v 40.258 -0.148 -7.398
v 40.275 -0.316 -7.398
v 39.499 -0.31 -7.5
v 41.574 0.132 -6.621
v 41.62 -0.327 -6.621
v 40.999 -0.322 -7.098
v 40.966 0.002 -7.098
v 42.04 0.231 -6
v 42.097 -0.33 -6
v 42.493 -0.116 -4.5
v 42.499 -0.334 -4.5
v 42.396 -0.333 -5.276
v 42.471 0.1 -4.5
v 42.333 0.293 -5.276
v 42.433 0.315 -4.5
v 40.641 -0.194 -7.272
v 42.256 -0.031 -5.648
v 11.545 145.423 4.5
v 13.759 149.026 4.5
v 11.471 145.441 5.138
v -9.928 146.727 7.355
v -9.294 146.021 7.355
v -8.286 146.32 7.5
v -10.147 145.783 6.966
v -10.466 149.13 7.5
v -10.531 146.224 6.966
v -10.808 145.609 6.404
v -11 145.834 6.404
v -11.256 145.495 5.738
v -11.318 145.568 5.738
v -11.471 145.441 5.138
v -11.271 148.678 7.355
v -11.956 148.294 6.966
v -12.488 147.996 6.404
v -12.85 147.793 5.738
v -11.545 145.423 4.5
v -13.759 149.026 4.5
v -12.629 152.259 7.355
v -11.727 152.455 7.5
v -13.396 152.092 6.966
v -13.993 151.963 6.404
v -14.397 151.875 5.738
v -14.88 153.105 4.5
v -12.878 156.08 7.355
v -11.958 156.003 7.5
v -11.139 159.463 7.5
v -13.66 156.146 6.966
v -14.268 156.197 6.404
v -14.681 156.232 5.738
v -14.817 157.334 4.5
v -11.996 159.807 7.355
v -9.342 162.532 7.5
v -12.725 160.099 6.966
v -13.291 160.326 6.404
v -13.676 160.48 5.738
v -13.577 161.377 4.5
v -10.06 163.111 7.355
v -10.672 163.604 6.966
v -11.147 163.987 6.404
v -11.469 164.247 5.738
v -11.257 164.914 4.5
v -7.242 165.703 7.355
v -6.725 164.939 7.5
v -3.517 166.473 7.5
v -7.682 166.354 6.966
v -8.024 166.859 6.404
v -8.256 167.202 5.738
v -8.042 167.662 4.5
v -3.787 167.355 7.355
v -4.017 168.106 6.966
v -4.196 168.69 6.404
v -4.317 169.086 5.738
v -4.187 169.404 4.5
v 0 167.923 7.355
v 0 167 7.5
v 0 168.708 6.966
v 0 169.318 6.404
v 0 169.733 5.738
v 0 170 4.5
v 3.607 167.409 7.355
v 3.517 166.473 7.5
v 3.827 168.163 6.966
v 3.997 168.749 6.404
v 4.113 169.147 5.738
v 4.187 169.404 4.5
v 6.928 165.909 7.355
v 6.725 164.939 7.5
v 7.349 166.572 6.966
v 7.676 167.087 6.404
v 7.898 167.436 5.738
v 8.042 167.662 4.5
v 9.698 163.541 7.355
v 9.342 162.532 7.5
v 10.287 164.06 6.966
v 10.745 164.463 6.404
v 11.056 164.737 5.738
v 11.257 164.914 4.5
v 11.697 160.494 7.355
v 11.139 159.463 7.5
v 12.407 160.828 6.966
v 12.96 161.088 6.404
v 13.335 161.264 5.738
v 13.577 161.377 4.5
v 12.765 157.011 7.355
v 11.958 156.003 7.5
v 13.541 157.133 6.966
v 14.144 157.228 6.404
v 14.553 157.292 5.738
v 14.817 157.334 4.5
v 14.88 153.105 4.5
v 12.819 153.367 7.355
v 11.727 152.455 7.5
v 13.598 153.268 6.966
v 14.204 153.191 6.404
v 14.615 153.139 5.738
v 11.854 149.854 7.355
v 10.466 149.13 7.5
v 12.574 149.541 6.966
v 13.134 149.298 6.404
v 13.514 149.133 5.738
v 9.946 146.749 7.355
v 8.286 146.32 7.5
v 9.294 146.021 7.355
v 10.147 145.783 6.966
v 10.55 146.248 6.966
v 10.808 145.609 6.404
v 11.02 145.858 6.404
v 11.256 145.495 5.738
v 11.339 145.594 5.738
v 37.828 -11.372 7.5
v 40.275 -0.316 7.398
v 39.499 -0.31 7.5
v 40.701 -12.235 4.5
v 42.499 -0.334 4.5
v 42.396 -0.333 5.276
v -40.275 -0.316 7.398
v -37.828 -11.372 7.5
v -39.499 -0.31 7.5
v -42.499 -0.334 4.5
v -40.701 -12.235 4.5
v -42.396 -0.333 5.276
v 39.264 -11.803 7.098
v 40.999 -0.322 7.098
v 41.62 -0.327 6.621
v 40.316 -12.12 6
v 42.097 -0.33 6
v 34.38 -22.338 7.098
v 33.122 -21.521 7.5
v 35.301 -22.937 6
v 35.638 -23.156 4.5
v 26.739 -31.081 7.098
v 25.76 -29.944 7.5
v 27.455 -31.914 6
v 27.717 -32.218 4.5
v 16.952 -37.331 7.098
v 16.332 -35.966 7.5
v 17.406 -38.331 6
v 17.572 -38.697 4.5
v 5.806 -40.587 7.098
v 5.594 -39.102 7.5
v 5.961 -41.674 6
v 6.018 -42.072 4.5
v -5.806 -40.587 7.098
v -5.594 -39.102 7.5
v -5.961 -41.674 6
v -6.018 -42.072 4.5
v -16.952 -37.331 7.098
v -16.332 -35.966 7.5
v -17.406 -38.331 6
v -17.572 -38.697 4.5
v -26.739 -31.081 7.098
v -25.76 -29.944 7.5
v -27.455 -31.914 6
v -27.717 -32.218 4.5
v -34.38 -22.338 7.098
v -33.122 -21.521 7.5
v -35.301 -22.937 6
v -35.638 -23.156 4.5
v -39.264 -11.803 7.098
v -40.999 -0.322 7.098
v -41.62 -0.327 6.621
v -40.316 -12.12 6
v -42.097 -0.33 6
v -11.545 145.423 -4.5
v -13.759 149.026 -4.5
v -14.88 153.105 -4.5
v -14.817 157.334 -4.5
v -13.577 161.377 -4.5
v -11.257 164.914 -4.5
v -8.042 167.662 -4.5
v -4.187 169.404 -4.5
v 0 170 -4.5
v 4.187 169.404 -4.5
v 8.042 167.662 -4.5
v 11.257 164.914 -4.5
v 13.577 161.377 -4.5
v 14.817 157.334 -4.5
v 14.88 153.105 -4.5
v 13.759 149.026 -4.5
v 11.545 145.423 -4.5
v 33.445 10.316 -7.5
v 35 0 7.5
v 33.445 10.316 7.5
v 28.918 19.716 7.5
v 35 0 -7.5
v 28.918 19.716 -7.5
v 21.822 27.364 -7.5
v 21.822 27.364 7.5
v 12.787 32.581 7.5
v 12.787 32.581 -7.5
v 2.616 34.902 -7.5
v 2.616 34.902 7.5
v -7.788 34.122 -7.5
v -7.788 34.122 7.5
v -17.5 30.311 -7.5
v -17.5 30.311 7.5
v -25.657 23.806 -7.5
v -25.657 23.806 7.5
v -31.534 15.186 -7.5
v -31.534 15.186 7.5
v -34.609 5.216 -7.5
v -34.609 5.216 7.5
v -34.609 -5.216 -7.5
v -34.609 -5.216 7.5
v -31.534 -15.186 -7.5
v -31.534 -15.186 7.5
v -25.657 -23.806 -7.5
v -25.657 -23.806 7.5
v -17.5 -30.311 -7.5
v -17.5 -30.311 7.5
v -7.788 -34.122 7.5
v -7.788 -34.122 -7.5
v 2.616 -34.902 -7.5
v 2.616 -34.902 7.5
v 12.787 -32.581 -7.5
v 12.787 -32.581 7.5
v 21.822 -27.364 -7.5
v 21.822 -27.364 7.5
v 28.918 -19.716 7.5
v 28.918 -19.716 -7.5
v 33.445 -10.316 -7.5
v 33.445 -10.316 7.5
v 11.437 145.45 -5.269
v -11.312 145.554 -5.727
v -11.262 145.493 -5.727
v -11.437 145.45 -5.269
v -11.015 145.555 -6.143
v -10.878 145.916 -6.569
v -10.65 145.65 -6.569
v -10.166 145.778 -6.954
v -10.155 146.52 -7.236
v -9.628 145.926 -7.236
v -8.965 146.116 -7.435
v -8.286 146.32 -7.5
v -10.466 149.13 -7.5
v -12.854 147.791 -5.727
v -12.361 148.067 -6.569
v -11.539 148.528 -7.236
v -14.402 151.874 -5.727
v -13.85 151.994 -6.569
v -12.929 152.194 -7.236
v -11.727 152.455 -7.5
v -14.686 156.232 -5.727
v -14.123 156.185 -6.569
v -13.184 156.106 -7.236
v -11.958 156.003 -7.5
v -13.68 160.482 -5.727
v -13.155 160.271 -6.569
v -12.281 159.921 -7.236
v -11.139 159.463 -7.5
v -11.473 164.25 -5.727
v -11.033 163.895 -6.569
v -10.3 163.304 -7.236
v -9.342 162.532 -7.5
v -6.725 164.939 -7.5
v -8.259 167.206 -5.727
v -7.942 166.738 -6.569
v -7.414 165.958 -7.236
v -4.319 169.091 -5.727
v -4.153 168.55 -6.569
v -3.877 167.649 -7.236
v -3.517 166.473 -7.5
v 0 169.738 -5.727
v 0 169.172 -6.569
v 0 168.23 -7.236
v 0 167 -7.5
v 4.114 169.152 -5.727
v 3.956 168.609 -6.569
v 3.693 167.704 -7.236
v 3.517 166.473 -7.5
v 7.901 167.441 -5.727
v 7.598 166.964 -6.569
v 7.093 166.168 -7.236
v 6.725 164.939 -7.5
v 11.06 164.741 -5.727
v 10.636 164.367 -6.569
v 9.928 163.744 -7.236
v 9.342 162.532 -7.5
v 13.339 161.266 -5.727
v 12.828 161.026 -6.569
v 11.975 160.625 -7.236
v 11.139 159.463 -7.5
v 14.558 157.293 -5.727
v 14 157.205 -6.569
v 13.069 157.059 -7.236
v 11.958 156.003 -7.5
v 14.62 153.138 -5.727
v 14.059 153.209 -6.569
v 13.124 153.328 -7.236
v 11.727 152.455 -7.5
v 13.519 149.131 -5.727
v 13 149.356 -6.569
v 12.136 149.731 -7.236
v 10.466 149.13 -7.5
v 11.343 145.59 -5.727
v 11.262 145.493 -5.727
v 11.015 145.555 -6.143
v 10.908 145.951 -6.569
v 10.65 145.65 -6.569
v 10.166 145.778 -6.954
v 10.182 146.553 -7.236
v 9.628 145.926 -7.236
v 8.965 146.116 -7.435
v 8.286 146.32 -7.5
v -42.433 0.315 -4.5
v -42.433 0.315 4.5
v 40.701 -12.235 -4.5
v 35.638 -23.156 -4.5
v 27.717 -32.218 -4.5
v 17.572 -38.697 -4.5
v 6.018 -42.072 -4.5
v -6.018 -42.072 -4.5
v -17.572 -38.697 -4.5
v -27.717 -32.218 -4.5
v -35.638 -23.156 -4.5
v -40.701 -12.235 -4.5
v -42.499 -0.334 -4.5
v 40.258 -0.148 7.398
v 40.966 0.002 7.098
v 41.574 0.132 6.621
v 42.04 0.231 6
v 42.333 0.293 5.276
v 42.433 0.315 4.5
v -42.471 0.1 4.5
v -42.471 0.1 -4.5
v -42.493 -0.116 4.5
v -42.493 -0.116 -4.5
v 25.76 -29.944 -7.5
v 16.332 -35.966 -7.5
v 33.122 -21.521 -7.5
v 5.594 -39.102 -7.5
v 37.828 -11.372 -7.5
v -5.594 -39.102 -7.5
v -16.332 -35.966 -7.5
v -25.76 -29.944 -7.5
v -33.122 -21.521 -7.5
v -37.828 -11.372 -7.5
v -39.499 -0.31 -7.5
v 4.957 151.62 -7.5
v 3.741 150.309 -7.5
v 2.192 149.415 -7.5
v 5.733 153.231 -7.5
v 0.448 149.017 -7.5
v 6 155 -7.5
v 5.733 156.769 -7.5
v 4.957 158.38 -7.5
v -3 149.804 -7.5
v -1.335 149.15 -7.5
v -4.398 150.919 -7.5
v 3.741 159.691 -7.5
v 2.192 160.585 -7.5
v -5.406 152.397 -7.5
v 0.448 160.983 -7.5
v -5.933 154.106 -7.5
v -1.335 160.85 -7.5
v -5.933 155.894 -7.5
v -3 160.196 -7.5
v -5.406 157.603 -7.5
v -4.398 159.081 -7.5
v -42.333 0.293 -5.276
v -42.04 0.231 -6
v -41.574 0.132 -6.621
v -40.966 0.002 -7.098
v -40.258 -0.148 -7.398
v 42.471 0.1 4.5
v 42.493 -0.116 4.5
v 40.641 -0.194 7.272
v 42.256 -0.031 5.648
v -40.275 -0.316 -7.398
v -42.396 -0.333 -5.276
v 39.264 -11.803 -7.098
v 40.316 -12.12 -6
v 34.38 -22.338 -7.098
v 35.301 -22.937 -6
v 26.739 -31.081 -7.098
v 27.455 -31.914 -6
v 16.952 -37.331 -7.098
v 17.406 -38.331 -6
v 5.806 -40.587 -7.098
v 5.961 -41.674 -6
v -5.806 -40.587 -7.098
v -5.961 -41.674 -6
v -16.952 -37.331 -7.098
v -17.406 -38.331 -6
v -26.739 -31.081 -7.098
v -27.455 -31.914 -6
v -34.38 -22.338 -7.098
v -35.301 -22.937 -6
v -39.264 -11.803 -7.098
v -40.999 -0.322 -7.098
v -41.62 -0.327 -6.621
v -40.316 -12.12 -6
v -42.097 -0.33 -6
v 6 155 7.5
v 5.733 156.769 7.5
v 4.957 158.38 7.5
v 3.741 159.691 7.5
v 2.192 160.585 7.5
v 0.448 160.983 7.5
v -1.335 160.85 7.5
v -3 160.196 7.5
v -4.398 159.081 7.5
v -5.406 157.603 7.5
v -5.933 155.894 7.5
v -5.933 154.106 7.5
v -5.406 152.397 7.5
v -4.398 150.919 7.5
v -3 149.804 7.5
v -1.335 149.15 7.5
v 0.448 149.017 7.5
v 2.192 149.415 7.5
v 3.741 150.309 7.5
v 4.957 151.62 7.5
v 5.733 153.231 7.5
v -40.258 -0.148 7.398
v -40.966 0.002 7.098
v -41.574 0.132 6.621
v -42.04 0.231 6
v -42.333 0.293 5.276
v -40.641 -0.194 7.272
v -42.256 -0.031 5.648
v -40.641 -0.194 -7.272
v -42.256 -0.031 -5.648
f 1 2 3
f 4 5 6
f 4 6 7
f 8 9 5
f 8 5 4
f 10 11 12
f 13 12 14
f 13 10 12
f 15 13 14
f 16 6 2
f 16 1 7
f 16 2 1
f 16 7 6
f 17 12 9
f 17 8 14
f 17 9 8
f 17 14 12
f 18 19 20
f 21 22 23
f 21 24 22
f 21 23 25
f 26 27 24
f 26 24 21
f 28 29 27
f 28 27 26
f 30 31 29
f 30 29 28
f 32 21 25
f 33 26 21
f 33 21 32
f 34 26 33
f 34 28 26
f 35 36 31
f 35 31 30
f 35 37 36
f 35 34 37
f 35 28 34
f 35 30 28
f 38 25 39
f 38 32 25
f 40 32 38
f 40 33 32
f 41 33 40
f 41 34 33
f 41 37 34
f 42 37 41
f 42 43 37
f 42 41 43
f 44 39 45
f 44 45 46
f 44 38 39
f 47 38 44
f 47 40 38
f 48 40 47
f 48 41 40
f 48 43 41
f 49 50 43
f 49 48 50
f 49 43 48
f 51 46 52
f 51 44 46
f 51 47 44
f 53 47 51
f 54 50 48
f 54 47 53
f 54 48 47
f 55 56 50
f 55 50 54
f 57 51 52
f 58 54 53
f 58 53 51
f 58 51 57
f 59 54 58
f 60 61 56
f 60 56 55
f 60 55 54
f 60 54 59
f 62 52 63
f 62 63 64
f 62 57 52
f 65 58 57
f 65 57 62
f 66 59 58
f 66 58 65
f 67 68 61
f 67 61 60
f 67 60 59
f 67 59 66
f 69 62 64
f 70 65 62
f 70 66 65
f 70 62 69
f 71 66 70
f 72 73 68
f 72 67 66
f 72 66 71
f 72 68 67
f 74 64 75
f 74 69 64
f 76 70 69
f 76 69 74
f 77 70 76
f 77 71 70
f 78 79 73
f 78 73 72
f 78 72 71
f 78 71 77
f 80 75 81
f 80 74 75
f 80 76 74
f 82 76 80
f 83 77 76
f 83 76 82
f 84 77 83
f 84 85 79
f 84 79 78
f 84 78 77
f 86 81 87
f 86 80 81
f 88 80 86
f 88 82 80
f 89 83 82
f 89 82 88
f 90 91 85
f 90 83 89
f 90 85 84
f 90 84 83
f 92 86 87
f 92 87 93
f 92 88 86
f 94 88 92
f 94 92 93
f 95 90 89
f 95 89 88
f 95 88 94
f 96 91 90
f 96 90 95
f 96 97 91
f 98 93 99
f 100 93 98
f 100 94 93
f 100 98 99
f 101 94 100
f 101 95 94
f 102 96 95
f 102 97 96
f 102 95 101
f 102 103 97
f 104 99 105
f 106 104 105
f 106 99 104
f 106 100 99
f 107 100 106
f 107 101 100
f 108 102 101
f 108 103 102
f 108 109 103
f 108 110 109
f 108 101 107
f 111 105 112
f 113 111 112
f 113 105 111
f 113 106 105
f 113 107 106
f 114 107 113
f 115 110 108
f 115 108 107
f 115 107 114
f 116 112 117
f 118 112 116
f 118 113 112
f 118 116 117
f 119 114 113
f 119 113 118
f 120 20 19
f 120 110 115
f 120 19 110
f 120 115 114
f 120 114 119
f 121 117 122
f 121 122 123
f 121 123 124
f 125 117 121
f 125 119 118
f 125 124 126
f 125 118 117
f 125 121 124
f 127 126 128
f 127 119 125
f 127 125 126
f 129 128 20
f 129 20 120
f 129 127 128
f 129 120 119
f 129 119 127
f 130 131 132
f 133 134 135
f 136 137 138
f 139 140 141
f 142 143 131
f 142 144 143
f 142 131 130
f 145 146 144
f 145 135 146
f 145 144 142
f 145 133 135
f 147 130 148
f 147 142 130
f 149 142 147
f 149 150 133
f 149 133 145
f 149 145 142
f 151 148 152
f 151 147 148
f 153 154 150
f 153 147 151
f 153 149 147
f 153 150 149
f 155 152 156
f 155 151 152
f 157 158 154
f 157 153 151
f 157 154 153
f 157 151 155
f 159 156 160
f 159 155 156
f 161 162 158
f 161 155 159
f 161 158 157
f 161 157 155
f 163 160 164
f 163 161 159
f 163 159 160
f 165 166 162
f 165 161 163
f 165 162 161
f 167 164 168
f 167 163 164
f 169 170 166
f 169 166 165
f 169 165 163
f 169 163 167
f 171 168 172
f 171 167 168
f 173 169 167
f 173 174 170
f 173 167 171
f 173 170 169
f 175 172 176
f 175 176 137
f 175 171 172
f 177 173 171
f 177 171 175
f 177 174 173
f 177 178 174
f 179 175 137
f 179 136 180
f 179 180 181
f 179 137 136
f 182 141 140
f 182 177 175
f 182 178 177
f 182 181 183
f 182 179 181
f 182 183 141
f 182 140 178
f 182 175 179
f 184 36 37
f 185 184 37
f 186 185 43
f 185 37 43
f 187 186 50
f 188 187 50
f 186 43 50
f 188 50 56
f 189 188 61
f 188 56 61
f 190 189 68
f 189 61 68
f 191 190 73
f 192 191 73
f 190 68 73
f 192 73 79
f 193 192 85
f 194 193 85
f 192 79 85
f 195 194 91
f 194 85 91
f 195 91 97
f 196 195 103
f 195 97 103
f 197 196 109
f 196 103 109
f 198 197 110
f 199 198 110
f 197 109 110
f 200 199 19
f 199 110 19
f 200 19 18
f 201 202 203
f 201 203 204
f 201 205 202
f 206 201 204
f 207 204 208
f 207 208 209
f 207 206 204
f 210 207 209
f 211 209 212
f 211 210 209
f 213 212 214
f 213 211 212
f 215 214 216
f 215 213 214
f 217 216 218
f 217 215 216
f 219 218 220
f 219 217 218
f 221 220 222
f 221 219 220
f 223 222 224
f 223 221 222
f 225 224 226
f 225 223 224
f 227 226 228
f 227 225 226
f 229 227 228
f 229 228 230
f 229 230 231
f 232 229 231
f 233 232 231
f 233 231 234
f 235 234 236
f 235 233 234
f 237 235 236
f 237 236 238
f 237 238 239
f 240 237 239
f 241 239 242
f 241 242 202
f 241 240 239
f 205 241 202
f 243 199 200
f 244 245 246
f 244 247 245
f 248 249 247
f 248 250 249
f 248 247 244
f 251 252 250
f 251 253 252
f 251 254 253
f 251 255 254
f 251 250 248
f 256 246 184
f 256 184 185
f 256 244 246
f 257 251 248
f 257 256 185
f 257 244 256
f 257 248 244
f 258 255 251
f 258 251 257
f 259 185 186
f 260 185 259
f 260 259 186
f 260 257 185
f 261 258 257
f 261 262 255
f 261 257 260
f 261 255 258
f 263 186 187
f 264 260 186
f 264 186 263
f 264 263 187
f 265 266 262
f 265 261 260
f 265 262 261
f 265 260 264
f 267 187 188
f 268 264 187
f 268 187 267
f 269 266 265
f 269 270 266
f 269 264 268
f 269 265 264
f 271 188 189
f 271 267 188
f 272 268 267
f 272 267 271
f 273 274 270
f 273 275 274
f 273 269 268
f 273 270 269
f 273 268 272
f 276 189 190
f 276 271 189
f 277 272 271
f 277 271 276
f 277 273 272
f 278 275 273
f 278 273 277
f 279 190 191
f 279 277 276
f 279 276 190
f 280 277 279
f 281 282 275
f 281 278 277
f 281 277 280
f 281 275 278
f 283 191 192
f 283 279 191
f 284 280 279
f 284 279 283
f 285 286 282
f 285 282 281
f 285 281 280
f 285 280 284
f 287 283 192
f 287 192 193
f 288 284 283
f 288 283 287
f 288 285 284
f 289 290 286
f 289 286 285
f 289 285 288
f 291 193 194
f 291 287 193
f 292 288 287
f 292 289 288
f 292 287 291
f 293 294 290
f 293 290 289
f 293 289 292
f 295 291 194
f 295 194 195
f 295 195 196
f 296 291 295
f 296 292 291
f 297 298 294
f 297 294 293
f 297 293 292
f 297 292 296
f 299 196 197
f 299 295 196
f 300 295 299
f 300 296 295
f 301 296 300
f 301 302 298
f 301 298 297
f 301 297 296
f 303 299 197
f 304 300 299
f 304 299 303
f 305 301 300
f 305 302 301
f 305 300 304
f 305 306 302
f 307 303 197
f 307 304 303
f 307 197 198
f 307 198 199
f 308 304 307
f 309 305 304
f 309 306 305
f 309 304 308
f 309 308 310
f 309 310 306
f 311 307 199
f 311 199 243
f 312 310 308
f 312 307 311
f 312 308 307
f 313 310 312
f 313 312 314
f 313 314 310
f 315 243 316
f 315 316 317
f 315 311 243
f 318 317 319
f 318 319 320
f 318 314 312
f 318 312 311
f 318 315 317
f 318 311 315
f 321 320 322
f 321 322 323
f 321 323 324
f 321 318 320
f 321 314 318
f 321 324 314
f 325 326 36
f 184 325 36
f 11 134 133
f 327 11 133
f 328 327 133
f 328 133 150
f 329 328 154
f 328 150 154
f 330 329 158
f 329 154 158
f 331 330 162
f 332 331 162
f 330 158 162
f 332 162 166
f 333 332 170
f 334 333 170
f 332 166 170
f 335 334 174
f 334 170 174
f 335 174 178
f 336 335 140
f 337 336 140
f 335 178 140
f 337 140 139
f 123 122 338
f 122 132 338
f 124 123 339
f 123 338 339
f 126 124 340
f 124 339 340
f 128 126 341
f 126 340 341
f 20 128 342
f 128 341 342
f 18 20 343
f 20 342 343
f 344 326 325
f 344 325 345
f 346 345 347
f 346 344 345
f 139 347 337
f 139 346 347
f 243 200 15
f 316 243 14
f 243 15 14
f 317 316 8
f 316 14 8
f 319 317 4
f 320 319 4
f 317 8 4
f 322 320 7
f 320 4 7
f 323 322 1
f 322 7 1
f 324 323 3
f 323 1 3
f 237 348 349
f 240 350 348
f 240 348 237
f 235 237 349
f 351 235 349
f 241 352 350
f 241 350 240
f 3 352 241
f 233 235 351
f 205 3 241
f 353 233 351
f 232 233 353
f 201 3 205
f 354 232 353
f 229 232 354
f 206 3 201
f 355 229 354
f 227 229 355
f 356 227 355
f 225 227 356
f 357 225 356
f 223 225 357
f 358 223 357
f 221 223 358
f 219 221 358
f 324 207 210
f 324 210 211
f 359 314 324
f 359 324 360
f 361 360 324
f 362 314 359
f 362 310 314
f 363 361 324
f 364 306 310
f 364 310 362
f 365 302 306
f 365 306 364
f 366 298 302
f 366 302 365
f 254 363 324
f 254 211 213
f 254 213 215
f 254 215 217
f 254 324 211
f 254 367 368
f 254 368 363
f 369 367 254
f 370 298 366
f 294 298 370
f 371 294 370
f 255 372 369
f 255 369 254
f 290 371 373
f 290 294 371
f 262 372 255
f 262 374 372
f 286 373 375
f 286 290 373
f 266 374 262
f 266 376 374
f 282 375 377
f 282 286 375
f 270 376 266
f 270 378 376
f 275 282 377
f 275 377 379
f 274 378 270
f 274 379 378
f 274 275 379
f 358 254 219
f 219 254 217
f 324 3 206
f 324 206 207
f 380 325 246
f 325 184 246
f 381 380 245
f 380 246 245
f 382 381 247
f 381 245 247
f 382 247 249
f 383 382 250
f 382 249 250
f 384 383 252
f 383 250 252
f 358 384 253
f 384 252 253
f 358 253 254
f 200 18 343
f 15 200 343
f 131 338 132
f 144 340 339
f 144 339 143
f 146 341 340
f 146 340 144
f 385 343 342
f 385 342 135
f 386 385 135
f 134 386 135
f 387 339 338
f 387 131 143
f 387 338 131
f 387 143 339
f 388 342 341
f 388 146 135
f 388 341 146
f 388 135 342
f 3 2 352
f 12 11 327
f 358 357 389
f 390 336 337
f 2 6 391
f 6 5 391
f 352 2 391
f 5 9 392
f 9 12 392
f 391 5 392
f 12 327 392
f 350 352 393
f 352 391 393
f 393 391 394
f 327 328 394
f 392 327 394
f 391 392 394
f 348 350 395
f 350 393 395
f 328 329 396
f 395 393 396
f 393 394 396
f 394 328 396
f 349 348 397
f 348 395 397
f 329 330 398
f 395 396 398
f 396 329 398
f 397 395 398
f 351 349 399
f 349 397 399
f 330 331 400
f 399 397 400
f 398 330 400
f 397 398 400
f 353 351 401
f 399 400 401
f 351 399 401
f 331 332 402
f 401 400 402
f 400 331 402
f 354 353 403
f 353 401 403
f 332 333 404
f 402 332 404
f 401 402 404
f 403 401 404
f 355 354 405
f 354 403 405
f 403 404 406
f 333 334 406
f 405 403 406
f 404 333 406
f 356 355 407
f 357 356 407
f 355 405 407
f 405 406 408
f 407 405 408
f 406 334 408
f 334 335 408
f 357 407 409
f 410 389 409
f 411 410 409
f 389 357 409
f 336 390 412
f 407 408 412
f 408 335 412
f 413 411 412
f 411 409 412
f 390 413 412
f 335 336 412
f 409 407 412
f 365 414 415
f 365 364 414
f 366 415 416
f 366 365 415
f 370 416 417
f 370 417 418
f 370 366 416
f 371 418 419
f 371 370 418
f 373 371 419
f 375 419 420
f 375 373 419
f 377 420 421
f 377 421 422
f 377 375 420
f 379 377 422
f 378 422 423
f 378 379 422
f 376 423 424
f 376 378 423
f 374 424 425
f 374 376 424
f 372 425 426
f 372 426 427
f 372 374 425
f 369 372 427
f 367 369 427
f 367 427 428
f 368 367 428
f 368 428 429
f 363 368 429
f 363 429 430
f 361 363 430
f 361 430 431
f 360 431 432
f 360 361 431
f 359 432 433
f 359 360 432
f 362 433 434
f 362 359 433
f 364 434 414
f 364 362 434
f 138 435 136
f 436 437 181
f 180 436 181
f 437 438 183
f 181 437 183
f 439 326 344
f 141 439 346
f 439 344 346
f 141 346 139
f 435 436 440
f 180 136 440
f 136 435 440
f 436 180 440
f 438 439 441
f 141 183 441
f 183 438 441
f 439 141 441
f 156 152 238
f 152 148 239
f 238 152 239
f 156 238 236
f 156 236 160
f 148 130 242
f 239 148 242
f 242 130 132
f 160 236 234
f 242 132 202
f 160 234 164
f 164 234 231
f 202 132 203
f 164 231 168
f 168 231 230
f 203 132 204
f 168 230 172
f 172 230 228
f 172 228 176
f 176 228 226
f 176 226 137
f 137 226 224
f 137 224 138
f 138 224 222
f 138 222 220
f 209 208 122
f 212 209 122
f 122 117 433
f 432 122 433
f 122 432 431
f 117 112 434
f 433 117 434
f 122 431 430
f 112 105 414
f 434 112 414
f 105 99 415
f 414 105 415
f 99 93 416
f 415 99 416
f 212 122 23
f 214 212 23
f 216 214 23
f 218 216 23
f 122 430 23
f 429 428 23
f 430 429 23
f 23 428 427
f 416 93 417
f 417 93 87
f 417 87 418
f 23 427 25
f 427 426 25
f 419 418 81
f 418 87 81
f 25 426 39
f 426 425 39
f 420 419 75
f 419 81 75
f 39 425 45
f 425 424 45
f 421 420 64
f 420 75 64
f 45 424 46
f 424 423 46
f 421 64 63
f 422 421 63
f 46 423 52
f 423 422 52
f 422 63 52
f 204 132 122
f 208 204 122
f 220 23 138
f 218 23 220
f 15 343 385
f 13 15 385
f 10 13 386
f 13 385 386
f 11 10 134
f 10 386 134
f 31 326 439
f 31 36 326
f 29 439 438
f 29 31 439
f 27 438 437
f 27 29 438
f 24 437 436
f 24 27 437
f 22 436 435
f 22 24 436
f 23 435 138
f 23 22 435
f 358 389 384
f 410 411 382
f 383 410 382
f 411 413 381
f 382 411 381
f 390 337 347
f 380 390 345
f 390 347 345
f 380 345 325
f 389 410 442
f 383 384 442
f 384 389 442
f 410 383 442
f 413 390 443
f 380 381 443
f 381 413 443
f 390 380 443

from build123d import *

# Parameters (mm, degrees)
SKETCH1_R           = 35
SKETCH1_R_2         = 6
BOSS_EXTRUDE1_DEPTH = 7.5
FILLET1_R           = 3


with BuildPart() as part:
    # Sketch1 → Boss-Extrude1 (new, symmetric)
    with BuildSketch(Plane.XY):
        with BuildLine():
            Line((-42.5, 0), (-11.544687954, 145.422934685))
            ThreePointArc((-11.544687954, 145.422934685), (0, 170), (11.544687954, 145.422934685))
            Line((11.544687954, 145.422934685), (42.5, 0))
            ThreePointArc((42.5, 0), (0, -42.5), (-42.5, 0))
        make_face()
        Circle(SKETCH1_R, mode=Mode.SUBTRACT)
        with Locations((0, 155)):
            Circle(SKETCH1_R_2, mode=Mode.SUBTRACT)
    extrude(amount=BOSS_EXTRUDE1_DEPTH, both=True)

    # Fillet1
    fillet1_edges = [part.edges().sort_by_distance(p)[0] for p in [
        (42.5, 0, 0),
        (-42.5, 0, 0),
        (27.022343977, 72.711467343, 7.5),
        (0, 170, 7.5),
        (-27.022343977, 72.711467343, 7.5),
        (0, -42.5, 7.5),
        (0, -42.5, -7.5),
        (-27.022343977, 72.711467343, -7.5),
        (0, 170, -7.5),
        (27.022343977, 72.711467343, -7.5),
    ]]
    fillet(fillet1_edges, radius=FILLET1_R)


solid = part.part
